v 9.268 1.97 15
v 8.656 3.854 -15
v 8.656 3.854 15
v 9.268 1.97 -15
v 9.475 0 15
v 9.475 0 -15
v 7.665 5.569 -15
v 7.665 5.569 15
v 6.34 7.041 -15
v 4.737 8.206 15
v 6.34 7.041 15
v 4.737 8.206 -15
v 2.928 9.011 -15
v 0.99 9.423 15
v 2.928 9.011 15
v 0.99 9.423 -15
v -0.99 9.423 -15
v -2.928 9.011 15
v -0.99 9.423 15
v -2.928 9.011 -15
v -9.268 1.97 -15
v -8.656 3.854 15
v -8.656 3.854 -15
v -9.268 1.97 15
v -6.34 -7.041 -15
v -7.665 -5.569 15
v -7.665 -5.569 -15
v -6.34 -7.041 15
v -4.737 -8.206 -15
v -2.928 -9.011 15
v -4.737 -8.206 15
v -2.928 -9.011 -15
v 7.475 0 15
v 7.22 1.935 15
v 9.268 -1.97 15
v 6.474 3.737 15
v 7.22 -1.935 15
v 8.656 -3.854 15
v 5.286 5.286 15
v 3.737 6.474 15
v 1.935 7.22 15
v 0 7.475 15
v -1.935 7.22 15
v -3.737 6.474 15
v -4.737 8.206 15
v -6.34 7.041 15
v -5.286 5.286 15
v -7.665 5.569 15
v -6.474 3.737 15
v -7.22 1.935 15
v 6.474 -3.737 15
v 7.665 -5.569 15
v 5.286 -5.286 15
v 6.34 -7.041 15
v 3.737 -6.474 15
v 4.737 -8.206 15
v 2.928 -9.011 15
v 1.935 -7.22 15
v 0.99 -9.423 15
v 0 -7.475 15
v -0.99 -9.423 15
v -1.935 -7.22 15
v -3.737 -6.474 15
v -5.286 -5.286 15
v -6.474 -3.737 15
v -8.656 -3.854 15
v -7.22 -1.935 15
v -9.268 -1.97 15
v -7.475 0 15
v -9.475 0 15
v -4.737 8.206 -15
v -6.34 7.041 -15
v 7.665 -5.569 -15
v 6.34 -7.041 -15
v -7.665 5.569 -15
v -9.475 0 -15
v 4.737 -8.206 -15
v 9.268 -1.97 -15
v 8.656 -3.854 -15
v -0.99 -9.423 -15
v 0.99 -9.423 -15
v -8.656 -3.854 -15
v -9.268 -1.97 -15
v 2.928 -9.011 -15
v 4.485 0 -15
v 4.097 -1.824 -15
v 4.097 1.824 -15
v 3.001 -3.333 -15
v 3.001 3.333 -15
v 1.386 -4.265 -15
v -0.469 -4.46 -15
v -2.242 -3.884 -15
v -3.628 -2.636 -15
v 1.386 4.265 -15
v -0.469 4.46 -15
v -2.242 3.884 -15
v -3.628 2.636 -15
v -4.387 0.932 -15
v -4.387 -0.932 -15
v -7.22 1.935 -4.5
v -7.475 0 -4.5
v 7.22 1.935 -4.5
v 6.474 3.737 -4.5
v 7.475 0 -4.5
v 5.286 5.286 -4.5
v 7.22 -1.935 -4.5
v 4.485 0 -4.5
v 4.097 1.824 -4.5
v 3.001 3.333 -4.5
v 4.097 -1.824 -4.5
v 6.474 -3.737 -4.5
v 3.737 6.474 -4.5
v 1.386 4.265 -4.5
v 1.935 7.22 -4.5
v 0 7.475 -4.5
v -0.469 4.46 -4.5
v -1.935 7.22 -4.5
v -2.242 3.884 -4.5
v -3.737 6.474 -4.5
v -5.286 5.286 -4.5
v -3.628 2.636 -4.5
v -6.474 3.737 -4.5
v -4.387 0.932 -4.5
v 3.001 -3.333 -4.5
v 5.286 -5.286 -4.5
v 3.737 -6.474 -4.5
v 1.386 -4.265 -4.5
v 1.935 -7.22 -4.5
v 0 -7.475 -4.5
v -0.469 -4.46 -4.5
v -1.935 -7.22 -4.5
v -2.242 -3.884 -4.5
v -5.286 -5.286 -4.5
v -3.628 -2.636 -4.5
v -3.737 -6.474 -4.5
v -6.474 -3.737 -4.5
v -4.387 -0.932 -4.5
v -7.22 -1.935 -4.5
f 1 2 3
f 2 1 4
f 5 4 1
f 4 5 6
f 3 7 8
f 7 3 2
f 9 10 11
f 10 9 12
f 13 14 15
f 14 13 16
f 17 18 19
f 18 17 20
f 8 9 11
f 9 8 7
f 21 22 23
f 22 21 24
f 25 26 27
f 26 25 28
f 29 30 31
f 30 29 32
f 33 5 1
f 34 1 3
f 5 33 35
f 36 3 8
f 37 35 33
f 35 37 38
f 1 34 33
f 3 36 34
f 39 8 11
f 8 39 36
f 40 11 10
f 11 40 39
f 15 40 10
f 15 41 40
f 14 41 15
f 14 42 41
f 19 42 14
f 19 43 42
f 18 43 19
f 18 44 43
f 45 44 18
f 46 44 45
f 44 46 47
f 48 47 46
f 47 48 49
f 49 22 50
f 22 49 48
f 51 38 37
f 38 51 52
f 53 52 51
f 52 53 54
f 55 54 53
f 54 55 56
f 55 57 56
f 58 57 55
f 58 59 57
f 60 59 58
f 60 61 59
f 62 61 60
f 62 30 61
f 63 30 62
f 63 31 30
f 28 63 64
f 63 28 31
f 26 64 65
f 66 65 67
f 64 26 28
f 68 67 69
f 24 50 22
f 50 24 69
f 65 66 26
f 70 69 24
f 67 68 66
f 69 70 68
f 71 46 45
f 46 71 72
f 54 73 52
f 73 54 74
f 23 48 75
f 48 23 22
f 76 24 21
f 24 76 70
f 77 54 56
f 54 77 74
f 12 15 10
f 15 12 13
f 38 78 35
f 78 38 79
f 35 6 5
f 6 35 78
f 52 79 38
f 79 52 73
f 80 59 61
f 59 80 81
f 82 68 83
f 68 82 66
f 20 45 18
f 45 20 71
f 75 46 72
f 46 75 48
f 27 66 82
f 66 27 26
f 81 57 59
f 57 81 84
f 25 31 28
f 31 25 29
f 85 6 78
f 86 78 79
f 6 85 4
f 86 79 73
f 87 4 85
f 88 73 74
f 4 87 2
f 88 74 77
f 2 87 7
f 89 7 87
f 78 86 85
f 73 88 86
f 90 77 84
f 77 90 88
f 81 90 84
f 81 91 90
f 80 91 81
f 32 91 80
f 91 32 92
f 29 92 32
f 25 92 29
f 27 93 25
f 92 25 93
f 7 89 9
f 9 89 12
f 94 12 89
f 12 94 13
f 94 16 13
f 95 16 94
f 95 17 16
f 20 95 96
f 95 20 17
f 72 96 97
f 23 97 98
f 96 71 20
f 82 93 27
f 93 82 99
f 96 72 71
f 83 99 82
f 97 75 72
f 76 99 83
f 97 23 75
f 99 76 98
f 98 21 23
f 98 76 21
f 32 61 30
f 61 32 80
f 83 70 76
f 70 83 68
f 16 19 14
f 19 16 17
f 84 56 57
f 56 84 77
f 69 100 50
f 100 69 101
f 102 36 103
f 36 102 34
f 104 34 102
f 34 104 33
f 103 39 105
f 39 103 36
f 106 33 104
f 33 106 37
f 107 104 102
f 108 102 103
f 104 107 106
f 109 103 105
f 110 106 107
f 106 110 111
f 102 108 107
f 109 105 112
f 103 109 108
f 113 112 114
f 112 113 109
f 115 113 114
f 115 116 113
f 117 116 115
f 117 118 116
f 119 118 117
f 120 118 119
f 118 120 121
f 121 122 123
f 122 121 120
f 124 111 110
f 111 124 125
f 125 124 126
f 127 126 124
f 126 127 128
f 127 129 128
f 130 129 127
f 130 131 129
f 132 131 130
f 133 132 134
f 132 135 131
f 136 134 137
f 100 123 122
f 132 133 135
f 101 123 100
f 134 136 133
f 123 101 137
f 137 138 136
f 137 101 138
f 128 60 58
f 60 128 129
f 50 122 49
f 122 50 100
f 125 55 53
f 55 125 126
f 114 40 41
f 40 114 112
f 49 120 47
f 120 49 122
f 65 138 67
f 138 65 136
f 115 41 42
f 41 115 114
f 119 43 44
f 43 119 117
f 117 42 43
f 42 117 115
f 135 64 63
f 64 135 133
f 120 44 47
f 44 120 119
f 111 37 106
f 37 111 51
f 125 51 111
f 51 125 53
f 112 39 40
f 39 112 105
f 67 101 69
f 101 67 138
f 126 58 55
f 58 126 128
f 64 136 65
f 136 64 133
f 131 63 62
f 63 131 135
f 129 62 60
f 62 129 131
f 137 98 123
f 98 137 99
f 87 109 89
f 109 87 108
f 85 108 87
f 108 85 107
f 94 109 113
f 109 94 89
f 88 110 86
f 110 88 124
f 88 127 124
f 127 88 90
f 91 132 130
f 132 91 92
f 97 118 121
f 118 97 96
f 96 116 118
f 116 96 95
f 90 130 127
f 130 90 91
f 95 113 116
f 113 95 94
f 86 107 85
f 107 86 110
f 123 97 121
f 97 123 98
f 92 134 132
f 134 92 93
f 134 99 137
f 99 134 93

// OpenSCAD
/*
 * Written by Dermot Tynan, Kalopa Research.
 * GPLv2.
 *
 * Cap to prevent water ingress into the WDI.
 *
 * All dimensions are in mm.
 */
wdi_shaft_dia = 7.8*1.15;
cap_inner_dia = 13*1.15;
cap_height = 20;
cap_thickness = 2;

module wind_cap()
{
	difference() {
		cylinder(r = cap_inner_dia / 2 + cap_thickness, h = cap_height + 10, center = true);
		translate([0, 0, -cap_thickness + 7.5]) cylinder(r = cap_inner_dia / 2, h = cap_height, center = true);
		cylinder(r = wdi_shaft_dia / 2, h = cap_height * 3, center = true);
	}
}

wind_cap();
